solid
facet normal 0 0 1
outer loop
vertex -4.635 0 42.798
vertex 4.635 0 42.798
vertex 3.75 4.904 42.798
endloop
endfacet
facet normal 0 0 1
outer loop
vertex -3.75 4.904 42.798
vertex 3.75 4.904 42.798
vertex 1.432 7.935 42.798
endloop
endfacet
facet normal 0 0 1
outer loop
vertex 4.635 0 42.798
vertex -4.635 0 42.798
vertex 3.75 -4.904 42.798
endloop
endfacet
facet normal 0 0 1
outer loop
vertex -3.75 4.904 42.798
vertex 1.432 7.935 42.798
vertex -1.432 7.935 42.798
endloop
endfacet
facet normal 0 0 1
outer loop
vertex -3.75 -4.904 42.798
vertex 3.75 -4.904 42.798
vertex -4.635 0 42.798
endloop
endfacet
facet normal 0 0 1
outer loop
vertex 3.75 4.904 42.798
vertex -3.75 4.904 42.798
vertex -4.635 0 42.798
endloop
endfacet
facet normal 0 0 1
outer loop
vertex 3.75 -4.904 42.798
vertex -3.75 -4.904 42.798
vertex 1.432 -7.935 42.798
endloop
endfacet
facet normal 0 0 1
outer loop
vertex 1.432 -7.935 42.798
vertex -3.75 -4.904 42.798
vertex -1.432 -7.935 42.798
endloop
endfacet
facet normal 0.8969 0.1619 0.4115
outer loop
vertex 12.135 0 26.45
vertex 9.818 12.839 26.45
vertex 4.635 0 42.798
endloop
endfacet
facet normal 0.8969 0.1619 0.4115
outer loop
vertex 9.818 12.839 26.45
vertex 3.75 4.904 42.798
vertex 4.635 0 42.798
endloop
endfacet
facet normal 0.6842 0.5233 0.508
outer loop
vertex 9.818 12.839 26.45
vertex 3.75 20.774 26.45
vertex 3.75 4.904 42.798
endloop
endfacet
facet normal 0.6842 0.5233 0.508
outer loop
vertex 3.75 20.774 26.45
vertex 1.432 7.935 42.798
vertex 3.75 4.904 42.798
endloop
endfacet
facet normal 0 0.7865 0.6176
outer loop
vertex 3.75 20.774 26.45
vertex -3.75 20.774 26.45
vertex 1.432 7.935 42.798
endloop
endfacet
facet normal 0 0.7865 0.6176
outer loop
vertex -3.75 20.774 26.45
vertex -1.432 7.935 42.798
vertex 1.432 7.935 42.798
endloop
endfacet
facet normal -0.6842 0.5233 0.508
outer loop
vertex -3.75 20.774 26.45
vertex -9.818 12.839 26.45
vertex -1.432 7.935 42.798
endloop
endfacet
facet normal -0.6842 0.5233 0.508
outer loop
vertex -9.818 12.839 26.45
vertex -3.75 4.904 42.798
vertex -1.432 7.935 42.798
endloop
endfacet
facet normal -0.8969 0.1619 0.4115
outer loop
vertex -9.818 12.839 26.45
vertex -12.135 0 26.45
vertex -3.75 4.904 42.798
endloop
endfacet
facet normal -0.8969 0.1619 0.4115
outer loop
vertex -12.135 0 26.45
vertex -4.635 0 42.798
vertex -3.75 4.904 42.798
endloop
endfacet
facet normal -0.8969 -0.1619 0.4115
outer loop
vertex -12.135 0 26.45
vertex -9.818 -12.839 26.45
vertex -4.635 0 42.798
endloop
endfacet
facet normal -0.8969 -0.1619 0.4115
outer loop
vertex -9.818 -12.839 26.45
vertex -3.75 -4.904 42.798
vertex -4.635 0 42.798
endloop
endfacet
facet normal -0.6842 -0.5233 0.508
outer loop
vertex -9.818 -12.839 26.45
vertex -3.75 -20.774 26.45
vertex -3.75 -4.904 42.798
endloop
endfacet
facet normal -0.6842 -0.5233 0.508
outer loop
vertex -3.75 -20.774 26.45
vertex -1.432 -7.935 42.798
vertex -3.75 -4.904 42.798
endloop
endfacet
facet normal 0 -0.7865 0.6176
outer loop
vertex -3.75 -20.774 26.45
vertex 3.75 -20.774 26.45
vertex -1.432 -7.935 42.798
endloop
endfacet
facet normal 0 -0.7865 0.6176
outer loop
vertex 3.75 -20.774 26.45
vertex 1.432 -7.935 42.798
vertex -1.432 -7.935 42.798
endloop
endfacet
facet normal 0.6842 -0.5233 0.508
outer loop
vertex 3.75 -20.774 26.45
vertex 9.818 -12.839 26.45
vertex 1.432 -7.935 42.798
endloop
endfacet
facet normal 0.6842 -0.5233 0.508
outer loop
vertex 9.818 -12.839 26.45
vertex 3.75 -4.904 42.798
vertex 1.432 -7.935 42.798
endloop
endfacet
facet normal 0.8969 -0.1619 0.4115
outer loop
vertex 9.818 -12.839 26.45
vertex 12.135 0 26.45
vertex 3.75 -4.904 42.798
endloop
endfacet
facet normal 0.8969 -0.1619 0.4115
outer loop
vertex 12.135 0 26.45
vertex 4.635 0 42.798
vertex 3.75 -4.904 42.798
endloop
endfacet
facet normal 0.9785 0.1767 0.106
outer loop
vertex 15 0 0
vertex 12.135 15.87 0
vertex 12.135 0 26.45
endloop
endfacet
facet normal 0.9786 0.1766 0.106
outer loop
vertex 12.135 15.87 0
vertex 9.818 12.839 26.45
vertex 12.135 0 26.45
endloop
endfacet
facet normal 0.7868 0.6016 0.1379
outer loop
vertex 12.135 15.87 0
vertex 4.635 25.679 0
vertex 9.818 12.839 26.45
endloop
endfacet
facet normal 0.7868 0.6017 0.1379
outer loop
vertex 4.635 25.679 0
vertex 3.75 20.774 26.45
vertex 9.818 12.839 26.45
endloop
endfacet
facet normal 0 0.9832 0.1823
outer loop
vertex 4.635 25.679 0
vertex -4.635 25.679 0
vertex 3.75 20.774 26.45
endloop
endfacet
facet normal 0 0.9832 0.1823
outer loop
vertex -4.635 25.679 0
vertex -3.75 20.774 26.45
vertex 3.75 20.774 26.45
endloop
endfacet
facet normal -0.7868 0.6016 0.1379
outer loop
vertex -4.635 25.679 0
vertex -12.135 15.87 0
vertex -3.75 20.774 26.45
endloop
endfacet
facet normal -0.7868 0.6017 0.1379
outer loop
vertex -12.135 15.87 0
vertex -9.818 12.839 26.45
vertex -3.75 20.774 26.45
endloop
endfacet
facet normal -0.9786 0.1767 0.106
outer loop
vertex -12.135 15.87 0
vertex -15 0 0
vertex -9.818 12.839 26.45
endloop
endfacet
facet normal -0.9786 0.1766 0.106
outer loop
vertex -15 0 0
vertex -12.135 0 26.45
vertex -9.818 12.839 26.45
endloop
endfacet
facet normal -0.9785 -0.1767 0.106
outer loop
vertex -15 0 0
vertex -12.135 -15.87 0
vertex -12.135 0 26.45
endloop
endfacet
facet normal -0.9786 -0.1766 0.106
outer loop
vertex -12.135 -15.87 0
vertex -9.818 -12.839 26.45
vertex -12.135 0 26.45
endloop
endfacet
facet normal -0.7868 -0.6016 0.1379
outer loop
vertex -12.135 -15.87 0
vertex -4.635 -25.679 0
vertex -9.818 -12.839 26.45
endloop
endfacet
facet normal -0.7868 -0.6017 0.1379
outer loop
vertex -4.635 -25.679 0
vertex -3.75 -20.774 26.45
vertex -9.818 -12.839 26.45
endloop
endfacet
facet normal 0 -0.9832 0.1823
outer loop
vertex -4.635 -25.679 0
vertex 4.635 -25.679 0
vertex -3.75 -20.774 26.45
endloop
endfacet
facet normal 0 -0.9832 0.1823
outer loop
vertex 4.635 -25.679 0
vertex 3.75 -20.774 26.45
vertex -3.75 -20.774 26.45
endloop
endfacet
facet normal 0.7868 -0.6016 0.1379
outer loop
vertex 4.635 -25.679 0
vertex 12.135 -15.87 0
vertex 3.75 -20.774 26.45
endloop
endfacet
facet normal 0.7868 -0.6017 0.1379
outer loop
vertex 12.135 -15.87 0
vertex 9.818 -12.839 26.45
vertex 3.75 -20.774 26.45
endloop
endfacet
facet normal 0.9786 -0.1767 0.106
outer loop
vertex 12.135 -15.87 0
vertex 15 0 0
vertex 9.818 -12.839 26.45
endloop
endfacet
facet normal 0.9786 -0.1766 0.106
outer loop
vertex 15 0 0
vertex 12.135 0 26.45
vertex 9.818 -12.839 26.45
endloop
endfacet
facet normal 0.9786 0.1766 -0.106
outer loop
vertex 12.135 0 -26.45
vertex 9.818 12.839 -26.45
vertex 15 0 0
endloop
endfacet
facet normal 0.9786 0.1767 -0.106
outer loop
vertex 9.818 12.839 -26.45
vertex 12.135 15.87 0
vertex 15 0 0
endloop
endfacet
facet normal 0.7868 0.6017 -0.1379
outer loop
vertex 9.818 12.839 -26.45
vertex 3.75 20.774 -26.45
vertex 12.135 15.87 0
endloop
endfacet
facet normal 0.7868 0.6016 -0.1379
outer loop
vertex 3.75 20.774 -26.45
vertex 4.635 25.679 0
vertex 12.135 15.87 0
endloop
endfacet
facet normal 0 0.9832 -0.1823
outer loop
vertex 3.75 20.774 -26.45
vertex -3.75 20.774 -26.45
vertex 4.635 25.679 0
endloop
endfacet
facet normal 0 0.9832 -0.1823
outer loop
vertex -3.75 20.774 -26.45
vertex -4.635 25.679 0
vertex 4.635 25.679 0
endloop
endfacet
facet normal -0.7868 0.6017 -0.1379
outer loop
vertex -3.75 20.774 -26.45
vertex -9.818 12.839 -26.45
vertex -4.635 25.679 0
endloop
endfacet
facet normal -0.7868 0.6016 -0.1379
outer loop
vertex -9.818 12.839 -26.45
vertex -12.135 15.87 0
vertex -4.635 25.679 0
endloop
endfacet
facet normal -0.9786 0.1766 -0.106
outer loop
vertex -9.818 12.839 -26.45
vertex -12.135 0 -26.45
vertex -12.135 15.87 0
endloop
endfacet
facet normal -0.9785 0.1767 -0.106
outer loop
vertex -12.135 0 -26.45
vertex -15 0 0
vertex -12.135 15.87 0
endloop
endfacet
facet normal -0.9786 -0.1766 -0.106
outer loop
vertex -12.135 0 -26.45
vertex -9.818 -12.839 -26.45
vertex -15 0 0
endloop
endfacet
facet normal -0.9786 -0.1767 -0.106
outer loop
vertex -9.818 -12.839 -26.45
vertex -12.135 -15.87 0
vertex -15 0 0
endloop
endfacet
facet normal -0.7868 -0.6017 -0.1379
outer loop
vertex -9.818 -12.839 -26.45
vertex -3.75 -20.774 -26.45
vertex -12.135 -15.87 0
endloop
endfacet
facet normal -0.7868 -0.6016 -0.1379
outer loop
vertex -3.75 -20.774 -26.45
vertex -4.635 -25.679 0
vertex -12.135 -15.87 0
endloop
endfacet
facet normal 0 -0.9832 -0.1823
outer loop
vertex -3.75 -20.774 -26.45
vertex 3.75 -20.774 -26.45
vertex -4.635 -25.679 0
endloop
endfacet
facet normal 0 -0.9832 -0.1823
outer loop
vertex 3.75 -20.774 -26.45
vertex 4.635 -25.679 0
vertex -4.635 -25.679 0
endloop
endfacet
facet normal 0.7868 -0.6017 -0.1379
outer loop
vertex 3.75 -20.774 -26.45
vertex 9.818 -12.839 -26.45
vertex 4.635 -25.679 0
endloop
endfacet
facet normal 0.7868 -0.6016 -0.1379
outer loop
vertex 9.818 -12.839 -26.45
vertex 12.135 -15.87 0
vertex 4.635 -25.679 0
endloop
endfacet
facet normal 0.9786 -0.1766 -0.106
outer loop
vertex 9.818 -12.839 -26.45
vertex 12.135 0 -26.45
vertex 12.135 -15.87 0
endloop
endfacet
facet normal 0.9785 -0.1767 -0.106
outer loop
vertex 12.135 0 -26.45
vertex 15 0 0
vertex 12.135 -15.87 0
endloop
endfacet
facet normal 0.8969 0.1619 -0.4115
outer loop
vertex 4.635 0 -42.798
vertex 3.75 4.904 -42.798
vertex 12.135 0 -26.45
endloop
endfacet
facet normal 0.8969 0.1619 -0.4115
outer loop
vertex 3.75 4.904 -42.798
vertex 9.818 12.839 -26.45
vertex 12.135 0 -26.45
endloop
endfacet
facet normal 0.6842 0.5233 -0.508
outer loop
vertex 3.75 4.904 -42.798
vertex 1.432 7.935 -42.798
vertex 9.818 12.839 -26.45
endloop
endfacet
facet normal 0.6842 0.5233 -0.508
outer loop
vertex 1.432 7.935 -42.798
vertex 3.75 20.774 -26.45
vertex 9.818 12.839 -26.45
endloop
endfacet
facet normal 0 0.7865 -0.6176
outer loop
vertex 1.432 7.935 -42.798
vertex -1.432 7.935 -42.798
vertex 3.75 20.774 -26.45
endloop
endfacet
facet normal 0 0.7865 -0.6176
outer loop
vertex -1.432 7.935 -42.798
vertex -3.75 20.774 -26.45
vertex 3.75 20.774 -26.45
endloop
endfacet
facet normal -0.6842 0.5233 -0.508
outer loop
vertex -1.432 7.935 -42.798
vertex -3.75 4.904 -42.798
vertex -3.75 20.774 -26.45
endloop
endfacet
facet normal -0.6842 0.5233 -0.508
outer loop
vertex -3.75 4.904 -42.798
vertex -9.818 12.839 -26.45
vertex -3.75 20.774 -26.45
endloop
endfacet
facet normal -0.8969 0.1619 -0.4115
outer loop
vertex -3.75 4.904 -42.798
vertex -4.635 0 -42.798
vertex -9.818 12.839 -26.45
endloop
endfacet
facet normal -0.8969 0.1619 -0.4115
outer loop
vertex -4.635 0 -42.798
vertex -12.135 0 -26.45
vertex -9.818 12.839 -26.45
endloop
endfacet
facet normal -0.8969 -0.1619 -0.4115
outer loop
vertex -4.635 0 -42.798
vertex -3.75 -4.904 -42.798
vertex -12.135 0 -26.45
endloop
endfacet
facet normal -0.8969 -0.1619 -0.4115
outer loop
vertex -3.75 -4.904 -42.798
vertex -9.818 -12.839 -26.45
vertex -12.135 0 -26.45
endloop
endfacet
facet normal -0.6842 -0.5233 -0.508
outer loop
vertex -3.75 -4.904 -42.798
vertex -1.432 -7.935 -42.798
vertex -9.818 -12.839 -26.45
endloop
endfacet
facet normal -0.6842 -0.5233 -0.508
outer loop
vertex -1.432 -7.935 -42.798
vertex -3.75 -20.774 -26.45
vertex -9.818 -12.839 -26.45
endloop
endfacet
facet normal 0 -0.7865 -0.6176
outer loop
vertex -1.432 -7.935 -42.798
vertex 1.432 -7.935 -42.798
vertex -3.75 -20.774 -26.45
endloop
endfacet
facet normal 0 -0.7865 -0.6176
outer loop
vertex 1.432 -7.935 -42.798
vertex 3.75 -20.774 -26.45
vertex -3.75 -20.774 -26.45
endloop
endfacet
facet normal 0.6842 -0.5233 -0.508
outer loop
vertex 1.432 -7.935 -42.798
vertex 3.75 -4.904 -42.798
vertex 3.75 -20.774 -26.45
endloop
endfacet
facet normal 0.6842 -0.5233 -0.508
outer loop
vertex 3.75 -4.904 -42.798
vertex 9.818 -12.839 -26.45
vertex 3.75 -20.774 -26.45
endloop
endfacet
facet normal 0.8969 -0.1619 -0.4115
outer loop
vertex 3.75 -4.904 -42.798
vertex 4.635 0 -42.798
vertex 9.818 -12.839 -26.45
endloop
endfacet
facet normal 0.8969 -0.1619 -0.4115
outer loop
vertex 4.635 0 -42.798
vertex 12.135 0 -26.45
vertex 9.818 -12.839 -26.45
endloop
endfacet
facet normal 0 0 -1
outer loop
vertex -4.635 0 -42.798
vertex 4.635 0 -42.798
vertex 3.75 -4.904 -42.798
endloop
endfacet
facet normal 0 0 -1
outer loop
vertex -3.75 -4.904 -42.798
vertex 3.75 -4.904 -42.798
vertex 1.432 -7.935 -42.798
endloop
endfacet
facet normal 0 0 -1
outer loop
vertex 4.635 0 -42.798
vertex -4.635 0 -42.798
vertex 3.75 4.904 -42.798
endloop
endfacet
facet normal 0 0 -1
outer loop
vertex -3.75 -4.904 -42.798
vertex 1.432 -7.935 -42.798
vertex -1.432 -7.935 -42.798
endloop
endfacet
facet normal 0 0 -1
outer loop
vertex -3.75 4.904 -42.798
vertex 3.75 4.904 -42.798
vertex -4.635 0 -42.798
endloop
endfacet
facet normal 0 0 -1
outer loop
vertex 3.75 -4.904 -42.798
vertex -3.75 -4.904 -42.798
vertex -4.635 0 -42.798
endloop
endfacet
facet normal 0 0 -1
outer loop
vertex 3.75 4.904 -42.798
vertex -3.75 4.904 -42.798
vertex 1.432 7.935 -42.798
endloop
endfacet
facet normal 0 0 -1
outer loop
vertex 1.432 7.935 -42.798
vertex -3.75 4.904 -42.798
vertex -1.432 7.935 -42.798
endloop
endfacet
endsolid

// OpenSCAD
// Generated by SolidPython 1.0.1 on 2020-07-29 00:46:46


scale(v = [5, 9, 15]) {
	sphere(r = 3);
}
/***********************************************
*********      SolidPython code:      **********
************************************************
 
# import packages: SolidPython
from solid import *
from solid.utils import *
from itertools import chain, combinations, permutations


class Resize:

    def __init__(self, scad_file):
        self.scad_file = scad_file
        #self.scad_file = import_scad(scad_file)
        # cone/cylinder param:
        self.r1 = 0
        self.r2 = 0
        self.h = 0
        # rectangular prism param:
        self.w = 0
        self.l = 0
        # ellipse param:
        self.r = 0

    # import OpenScad code (file name corresponds to shape)


    # classify shape + parameters
    def assign(self, param1, param2, param3):
        if self.scad_file == 'cone.scad':
            self.r1 = param1
            self.r2 = param2
            self.h = param3
        elif self.scad_file == 'cylinder.scad':
            self.r1 = param1
            self.r2 = param2
            self.h = param3
        elif self.scad_file == 'rectangularPrism.scad':
            self.h = param1
            self.l = param2
            self.w = param3
        else:
            self.r = param1
            self.h = param2

    # resize parameters
    def iterate(self):
        x = range(3, 20, 2)
        i = 1
        if self.scad_file == 'cone.scad':
            tempList = list(permutations(x, 2))
            for temp in tempList:
                param1 = temp[0]
                param2 = temp[1]
                filepath = 'produced_scad_files/' + 'cone' + str(param1) + '_' + str(param2) + '_' + '.scad'
                scad_render_to_file(cylinder(h=param1, r1=param2, r2=0), filepath)

        elif self.scad_file == 'cylinder.scad':
            tempList = list(permutations(x, 3))
            for temp in tempList:
                param1 = temp[0]
                param2 = temp[1]
                filepath = 'produced_scad_files/' + 'cylinder' + str(param1) + '_' + str(param2) + '_' + '.scad'
                scad_render_to_file(cylinder(h=param1, r1=param2, r2=param2), filepath)

        elif self.scad_file == 'rectangularPrism.scad':
            tempList = list(permutations(x, 3))
            for temp in tempList:
                param1 = temp[0]
                param2 = temp[1]
                param3 = temp[2]
                filepath = 'produced_scad_files/' + 'rectangularPrism' + str(param1) + '_' + str(param2) + '_' + str(
                    param3) + '.scad'
                scad_render_to_file(cube(size=(param1, param2, param3)), filepath)

        elif self.scad_file == 'ellipse.scad':
            tempList = list(permutations(x, 4))
            for temp in tempList:
                param1 = temp[0]
                param2 = temp[1]
                param3 = temp[2]
                param4 = temp[3]
                filepath = 'produced_scad_files/' + 'ellipse' + str(param1) + '_' + str(param2) + '_' + str(param3) + '_' + str(param4) + '.scad'
                scad_render_to_file(scale([param1, param2, param3])(sphere(r=param4)), filepath)

    def render_to_scadfile(self):
        scad_render_to_file(scad, 'example.scad') 
 
************************************************/
